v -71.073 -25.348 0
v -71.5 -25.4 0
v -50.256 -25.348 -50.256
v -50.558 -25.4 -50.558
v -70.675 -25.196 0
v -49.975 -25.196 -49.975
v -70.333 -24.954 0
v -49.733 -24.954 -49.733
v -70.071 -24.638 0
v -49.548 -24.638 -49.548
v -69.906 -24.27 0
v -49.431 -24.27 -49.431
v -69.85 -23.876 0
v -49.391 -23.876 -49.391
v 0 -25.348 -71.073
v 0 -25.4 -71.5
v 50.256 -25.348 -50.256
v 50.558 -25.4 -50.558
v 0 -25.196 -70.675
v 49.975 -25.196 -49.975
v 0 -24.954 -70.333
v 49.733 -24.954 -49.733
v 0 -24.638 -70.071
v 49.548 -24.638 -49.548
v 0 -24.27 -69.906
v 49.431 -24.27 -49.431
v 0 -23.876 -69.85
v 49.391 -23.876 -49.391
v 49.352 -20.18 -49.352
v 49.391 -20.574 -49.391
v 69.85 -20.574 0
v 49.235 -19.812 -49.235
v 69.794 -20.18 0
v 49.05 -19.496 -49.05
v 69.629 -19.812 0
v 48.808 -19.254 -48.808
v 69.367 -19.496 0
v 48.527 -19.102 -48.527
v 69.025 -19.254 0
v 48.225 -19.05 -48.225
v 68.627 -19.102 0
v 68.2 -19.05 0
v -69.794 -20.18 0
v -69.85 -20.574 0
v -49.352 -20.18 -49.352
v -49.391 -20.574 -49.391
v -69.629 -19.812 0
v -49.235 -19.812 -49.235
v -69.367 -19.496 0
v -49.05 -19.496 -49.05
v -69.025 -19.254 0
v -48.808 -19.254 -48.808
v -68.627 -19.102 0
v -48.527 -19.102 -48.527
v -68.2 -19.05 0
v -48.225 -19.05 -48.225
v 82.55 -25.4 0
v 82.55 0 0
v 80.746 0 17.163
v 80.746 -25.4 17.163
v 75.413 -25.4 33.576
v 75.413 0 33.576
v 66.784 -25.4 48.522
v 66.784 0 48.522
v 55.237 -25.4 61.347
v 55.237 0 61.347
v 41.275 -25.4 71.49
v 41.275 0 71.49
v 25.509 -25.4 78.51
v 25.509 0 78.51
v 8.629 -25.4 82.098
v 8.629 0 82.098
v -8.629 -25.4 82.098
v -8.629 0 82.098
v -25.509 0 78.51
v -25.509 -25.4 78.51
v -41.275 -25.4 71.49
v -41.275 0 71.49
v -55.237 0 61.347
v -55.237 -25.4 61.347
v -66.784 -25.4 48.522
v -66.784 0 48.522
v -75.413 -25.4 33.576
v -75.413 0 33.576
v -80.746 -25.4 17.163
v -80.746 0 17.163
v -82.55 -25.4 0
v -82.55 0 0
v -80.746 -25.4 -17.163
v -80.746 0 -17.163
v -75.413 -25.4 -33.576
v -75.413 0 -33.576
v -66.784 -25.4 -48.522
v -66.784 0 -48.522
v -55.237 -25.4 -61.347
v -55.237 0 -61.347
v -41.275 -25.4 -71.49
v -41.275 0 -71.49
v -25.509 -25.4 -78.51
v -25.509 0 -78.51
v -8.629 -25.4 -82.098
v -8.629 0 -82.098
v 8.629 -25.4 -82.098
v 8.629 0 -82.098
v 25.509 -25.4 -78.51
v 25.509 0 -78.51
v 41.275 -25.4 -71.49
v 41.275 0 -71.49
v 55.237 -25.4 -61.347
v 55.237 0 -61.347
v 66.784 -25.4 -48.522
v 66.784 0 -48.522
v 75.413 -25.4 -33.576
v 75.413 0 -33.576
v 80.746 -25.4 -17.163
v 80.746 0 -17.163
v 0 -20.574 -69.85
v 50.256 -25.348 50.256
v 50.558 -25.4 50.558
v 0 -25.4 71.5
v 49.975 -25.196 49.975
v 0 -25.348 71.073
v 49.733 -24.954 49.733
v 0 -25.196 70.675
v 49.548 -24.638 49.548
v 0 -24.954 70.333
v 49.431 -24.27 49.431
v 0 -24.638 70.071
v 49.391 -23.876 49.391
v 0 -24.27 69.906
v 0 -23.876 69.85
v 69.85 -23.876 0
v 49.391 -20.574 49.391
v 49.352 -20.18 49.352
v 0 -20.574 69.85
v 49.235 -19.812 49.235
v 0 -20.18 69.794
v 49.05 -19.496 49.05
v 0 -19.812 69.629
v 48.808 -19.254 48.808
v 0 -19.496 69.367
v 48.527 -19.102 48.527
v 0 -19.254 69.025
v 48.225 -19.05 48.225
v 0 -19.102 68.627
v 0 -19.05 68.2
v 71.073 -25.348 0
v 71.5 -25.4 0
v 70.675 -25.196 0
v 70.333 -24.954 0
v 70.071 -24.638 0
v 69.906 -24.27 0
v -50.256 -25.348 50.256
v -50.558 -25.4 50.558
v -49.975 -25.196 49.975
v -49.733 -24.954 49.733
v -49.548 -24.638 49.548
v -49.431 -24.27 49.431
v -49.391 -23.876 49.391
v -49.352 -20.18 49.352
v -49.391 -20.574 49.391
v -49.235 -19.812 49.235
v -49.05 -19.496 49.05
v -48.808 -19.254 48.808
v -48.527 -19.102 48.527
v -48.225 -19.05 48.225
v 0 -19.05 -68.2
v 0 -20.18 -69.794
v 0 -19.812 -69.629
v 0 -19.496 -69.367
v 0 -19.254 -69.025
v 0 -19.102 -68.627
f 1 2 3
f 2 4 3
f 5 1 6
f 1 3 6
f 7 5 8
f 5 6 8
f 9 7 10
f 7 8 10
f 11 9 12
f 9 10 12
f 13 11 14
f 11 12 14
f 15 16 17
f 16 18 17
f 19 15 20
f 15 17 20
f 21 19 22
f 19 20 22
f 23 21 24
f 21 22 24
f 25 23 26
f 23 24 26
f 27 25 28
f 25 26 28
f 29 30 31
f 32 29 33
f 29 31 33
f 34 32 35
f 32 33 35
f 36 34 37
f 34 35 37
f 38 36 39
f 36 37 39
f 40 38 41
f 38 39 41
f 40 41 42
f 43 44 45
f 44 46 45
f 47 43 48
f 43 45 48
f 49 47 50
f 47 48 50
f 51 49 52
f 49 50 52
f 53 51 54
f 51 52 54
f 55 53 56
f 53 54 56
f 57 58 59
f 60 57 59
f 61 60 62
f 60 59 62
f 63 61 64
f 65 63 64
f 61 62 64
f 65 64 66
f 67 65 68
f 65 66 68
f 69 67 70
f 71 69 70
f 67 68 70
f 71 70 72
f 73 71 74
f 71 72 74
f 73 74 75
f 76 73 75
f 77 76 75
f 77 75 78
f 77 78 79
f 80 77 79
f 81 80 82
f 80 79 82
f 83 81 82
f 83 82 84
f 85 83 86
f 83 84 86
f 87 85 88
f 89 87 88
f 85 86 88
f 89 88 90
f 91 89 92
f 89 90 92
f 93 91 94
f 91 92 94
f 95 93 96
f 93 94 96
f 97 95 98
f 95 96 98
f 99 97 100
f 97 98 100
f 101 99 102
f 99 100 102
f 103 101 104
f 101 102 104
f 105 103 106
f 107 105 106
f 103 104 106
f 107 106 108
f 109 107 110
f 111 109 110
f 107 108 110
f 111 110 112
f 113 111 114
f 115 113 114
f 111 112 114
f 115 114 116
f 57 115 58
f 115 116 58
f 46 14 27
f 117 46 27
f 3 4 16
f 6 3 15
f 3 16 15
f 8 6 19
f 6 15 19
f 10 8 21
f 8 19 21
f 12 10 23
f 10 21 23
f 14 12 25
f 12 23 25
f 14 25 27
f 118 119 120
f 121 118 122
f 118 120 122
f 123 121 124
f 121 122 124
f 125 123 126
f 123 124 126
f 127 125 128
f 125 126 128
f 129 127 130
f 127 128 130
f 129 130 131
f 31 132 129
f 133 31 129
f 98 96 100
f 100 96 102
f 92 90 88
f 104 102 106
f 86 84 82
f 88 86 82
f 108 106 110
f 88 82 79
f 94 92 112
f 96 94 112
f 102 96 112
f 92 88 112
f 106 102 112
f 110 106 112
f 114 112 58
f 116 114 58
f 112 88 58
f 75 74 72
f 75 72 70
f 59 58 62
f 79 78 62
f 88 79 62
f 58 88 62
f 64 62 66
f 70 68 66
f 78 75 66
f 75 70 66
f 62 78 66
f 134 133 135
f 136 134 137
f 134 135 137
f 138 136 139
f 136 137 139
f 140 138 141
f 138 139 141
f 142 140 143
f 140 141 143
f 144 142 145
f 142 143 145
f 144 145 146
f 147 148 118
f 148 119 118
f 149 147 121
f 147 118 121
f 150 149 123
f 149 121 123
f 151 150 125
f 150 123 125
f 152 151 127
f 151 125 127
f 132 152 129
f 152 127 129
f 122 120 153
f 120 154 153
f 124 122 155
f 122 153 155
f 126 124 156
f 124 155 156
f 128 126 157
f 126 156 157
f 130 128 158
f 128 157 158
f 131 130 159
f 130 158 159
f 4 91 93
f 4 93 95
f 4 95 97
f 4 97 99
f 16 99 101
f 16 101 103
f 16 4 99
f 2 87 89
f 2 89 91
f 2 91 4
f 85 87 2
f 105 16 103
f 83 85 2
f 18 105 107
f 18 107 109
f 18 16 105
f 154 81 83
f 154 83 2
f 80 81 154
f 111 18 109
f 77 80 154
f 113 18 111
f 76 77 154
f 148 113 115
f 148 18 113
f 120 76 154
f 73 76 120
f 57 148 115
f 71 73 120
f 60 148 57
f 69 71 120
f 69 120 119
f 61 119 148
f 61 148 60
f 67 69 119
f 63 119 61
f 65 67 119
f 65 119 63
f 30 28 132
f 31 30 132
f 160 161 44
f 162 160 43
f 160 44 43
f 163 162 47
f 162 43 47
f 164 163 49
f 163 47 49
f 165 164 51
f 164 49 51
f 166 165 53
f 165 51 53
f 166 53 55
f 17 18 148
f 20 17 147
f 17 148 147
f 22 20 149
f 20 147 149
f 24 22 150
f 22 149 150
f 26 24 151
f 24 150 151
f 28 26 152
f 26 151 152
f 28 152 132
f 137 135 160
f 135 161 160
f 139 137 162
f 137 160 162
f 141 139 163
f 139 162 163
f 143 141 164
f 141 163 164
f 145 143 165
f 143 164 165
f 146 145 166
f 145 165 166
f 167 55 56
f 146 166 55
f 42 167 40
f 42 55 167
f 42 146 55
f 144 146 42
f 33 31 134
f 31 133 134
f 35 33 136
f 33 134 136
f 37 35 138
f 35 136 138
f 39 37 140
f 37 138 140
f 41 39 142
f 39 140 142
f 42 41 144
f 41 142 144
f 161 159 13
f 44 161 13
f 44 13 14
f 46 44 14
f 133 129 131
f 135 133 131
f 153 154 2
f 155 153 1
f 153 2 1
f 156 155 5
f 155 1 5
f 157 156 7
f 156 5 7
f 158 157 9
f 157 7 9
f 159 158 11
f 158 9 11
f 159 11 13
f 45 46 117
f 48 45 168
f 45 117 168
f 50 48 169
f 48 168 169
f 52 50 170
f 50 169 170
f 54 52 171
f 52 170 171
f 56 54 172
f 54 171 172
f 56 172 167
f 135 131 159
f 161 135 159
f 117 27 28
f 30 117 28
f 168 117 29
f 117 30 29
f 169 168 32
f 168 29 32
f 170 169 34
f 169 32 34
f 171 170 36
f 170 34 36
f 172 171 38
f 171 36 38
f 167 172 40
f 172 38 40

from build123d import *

# Parameters (mm, degrees)
F0_R     = 82.55
F1_DEPTH = 25.4
F3_DEPTH = 6.35
F4_R     = 1.524


with BuildPart() as f1:
    # F0 (on Front) → F1 (new body)
    with BuildSketch(Plane.XZ):
        Circle(F0_R)
    extrude(amount=F1_DEPTH)

    # F2 (on face) → F3 (cut)
    with BuildSketch(Plane.XZ.offset(25.4)):
        Polygon((49.391409, -49.391409), (69.85, 0), (49.391409, 49.391409), (0, 69.85), (-49.391409, 49.391409), (-69.85, 0), (-49.391409, -49.391409), (0, -69.85), align=None)
    extrude(amount=-F3_DEPTH, mode=Mode.SUBTRACT)

    # F4
    f4_edges = [f1.edges().sort_by_distance(p)[0] for p in [
        (59.620704, -19.05, -24.695704),
        (59.620704, -19.05, 24.695704),
        (24.695704, -19.05, 59.620704),
        (-24.695704, -19.05, 59.620704),
        (-59.620704, -19.05, 24.695704),
        (-59.620704, -19.05, -24.695704),
        (-24.695704, -19.05, -59.620704),
        (24.695704, -19.05, -59.620704),
        (-59.620704, -25.4, 24.695704),
        (-24.695704, -25.4, 59.620704),
        (24.695704, -25.4, 59.620704),
        (59.620704, -25.4, 24.695704),
        (59.620704, -25.4, -24.695704),
        (24.695704, -25.4, -59.620704),
        (-24.695704, -25.4, -59.620704),
        (-59.620704, -25.4, -24.695704),
    ]]
    fillet(f4_edges, radius=F4_R)


solid = f1.part
